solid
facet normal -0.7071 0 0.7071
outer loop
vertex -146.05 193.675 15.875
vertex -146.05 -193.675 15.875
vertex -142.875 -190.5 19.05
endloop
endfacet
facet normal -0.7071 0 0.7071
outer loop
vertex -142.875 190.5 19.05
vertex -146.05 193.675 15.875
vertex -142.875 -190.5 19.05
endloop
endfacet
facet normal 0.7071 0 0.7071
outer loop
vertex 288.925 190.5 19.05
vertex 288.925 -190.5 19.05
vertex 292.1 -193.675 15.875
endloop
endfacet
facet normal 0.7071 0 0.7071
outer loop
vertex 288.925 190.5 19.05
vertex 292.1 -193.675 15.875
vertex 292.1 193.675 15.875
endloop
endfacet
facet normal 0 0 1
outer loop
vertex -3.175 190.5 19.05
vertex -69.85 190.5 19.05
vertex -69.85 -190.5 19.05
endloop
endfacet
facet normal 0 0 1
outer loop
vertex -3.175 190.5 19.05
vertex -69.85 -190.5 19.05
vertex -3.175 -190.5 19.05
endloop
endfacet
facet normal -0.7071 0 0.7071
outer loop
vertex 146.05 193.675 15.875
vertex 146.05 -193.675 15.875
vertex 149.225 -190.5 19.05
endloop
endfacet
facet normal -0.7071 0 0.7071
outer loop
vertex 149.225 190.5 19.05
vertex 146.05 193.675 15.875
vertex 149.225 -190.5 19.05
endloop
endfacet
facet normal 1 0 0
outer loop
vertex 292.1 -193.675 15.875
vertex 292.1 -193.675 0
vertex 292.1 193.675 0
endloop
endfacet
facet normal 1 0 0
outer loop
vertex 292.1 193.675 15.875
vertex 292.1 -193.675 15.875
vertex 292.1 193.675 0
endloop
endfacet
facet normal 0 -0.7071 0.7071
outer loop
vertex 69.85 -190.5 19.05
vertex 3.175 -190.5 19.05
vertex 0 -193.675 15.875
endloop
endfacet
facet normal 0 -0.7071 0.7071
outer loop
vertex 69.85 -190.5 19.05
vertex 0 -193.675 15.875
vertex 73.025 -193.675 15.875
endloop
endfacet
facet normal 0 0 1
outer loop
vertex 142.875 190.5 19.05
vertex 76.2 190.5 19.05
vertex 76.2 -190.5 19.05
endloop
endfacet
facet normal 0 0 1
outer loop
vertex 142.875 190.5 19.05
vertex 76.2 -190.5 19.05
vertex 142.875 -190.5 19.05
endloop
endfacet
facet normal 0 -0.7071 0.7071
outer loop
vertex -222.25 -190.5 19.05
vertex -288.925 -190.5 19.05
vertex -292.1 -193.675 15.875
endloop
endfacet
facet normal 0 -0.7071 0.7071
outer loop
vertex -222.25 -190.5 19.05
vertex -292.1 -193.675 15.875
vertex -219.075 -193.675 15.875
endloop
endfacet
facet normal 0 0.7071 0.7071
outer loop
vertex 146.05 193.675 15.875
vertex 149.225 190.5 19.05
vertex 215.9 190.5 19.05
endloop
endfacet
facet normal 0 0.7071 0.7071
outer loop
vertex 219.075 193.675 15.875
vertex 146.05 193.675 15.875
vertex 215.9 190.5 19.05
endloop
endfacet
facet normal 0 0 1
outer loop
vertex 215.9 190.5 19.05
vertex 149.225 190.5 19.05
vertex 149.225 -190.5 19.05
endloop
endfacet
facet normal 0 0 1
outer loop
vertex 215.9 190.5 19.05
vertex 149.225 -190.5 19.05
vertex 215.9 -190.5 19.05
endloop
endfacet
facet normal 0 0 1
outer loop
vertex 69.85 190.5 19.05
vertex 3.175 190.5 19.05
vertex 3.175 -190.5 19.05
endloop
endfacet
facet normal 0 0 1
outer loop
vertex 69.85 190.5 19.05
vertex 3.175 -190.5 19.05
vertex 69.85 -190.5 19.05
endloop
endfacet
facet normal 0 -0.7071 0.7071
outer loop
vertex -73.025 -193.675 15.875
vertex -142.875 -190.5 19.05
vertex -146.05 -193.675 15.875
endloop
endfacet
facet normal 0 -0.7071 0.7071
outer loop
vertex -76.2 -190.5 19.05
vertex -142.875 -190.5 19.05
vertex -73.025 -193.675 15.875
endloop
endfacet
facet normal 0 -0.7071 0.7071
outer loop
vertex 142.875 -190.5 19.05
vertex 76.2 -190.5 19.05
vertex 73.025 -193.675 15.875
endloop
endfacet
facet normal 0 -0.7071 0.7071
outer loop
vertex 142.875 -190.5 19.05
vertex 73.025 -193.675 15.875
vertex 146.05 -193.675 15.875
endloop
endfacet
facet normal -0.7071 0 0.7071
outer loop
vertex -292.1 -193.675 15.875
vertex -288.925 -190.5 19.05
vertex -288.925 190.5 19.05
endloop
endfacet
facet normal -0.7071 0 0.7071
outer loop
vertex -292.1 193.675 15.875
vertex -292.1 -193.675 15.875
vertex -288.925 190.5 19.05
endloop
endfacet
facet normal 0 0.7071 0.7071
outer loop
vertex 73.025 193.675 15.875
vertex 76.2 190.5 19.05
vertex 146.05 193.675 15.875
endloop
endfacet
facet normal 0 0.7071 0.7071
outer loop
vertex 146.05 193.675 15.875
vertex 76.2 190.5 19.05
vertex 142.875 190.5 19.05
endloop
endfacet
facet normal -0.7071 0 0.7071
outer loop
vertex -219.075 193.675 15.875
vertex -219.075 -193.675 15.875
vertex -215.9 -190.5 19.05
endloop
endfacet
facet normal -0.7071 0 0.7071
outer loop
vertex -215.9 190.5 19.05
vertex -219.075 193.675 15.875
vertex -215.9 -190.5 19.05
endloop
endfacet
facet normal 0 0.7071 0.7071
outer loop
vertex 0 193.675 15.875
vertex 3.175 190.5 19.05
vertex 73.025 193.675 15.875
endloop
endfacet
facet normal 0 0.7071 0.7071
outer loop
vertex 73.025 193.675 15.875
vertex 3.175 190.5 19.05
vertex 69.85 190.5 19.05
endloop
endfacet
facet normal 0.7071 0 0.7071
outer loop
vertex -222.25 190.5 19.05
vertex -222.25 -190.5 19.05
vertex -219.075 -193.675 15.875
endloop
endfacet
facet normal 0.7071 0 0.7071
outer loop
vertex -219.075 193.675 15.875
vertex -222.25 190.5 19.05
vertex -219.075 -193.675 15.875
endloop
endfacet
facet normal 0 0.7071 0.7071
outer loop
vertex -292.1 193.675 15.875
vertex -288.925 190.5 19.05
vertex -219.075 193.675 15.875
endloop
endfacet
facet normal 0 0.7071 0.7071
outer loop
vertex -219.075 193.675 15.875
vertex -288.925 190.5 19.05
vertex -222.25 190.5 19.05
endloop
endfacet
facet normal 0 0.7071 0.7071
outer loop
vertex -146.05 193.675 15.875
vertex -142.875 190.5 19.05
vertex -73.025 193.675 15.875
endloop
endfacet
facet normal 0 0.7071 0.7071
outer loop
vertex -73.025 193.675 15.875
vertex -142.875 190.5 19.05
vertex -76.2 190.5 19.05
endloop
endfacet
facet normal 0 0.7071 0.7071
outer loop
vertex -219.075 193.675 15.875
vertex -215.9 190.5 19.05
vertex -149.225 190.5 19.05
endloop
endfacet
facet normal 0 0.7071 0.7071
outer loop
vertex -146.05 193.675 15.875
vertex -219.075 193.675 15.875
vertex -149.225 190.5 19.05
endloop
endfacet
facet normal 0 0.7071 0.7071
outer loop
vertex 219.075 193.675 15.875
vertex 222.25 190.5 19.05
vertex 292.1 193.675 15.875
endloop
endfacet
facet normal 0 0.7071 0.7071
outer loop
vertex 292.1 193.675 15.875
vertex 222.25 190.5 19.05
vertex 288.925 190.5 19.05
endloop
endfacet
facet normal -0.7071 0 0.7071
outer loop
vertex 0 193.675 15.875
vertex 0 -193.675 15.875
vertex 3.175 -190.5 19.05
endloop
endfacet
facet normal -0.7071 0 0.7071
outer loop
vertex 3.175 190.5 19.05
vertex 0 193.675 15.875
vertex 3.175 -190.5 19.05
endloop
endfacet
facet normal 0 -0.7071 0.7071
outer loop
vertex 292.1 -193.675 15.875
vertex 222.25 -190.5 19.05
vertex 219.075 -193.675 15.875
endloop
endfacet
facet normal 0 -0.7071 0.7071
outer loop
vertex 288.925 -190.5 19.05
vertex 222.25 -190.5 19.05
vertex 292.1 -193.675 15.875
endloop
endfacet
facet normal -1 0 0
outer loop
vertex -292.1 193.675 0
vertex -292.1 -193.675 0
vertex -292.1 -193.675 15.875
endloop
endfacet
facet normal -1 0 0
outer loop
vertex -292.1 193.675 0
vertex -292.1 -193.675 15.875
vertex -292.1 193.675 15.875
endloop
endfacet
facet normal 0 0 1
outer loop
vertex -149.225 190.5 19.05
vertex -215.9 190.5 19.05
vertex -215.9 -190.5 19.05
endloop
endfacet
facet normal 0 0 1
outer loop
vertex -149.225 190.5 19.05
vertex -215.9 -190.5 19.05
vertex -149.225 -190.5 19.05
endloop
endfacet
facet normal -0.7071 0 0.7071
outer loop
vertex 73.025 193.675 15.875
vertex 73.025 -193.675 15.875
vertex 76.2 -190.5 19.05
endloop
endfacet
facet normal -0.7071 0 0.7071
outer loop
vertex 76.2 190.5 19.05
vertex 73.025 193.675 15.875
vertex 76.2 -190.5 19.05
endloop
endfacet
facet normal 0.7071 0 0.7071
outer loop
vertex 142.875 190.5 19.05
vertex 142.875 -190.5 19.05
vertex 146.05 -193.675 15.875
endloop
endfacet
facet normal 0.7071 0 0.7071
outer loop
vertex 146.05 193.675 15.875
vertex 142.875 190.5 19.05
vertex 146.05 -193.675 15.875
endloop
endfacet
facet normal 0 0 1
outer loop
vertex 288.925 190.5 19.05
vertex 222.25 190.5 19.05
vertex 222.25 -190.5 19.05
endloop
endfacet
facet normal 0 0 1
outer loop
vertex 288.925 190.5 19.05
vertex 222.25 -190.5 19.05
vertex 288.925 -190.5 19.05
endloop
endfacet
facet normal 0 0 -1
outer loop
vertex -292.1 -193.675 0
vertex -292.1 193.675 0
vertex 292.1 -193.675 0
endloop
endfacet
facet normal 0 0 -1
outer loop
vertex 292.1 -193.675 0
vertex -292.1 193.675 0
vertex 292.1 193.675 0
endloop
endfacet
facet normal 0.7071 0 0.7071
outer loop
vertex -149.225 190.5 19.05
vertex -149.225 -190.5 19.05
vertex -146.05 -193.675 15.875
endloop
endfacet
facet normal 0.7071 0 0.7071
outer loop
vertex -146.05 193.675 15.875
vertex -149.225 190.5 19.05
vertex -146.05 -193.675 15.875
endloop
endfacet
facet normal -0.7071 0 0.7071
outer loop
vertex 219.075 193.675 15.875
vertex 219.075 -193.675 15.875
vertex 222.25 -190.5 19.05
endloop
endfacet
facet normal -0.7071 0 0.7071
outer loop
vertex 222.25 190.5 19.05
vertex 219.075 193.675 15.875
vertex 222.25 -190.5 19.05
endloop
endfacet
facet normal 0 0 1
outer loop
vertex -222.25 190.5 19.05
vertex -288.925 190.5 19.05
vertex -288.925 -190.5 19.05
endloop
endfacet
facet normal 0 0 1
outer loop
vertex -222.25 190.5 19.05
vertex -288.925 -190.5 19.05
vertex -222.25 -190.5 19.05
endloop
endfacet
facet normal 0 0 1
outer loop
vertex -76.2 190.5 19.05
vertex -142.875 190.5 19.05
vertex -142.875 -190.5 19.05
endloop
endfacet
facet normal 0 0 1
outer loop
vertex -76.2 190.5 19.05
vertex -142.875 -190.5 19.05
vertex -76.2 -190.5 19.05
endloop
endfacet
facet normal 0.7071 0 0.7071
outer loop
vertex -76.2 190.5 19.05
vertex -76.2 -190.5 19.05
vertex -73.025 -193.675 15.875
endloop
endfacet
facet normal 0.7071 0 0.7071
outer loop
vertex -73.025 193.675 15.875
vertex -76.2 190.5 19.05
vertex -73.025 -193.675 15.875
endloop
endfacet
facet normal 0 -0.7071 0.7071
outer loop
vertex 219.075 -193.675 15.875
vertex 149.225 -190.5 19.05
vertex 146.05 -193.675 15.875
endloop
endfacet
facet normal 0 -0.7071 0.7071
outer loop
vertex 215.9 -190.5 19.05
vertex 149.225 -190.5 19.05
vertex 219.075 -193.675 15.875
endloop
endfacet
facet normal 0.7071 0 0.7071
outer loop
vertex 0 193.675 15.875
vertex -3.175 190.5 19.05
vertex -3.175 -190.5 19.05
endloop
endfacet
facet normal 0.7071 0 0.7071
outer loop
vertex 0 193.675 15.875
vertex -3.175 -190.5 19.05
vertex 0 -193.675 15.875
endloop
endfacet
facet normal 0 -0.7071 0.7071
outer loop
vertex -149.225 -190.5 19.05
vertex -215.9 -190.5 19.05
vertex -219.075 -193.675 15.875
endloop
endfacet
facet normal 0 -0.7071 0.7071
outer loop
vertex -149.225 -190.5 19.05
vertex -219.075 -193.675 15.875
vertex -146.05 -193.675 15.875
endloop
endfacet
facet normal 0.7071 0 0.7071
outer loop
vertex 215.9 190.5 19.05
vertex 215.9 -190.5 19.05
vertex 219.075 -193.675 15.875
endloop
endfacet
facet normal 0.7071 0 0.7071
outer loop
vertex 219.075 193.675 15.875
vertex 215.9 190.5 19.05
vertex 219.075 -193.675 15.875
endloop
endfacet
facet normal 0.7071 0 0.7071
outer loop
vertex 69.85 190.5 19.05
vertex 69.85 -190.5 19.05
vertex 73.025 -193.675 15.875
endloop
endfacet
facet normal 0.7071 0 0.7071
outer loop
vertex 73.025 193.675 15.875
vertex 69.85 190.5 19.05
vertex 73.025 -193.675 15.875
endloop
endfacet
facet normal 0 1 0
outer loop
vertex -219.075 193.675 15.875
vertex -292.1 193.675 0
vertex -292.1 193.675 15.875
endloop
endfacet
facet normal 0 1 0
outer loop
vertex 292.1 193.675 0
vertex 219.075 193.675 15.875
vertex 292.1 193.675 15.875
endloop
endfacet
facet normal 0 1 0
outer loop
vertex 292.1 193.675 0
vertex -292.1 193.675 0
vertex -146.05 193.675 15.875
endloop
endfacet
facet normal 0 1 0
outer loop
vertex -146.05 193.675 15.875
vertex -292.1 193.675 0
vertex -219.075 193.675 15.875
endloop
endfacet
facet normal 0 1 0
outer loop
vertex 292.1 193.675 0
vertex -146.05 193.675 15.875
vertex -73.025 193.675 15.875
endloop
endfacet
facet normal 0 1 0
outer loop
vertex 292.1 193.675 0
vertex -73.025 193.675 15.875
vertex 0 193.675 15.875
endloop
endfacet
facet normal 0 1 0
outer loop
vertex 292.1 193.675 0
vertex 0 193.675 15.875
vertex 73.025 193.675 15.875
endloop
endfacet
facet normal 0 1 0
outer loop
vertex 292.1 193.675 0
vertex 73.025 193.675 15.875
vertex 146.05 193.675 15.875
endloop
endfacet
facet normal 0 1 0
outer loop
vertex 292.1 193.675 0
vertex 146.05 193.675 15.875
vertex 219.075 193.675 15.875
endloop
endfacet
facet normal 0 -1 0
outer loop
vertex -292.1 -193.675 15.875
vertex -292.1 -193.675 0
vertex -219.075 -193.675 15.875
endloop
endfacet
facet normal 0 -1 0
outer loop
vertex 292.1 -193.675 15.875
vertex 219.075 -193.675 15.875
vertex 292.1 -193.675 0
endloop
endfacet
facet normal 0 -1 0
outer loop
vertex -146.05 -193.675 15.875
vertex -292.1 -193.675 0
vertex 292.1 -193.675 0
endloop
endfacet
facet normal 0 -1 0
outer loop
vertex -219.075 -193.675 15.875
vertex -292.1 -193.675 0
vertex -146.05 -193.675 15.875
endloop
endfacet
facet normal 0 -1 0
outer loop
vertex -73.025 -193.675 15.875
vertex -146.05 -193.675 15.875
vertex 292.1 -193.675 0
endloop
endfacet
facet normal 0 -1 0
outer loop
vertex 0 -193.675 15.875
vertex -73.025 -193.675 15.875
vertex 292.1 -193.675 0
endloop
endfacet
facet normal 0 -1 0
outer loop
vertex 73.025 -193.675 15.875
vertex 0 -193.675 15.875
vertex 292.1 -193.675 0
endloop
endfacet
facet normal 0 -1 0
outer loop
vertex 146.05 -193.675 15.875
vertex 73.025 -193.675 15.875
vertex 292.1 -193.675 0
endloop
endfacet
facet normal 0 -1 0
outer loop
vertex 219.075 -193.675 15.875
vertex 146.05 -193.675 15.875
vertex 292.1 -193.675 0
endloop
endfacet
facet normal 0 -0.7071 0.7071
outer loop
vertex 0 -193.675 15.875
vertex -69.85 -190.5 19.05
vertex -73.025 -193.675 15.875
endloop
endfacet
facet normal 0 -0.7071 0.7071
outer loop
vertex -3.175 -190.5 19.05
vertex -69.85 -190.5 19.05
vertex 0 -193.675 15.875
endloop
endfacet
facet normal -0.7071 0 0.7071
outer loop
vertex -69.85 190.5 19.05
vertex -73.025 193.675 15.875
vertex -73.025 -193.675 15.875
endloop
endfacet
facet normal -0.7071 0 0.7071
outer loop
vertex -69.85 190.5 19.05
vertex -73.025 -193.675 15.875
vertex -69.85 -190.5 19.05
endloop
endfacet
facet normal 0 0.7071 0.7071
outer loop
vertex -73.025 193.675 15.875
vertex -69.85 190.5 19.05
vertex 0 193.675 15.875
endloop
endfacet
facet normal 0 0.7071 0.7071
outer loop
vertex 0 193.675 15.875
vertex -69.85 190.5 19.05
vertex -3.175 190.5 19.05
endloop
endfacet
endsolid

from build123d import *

# Parameters (mm, degrees)
F0_W     = 584.2
F0_H     = 387.35
F1_DEPTH = 19.05
F3_DEPTH = 387.351
F4_SIZE  = 3.17499


# Not quite as in the source:
# - a fillet or chamfer is up to 0.001 mm smaller than in the source, because OpenCascade refuses the exact size


with BuildPart() as f1:
    # F0 (on Top) → F1 (new body)
    with BuildSketch(Plane.XY):
        Rectangle(F0_W, F0_H)
    extrude(amount=F1_DEPTH)

    # F2 (on face) → F3 (cut, through all)
    with BuildSketch(Plane.XZ.offset(193.675)):
        Polygon((-219.075, 19.05), (-222.25, 19.05), (-219.075, 15.875), (-215.9, 19.05), align=None)
        Polygon((-146.05, 19.05), (-149.225, 19.05), (-146.05, 15.875), (-142.875, 19.05), align=None)
        Polygon((-73.025, 19.05), (-76.2, 19.05), (-73.025, 15.875), (-69.85, 19.05), align=None)
        Polygon((0, 19.05), (-3.175, 19.05), (0, 15.875), (3.175, 19.05), align=None)
        Polygon((73.025, 19.05), (69.85, 19.05), (73.025, 15.875), (76.2, 19.05), align=None)
        Polygon((146.05, 19.05), (142.875, 19.05), (146.05, 15.875), (149.225, 19.05), align=None)
        Polygon((219.075, 19.05), (215.9, 19.05), (219.075, 15.875), (222.25, 19.05), align=None)
    extrude(amount=-F3_DEPTH, mode=Mode.SUBTRACT)

    # F4 (size 3.175 in the source; OpenCascade refuses exactly that, so slightly less here)
    f4_edges = [f1.edges().sort_by_distance(p)[0] for p in [
        (-292.1, 0, 19.05),
        (-257.175, -193.675, 19.05),
        (-182.5625, -193.675, 19.05),
        (-109.5375, -193.675, 19.05),
        (-36.5125, -193.675, 19.05),
        (36.5125, -193.675, 19.05),
        (109.5375, -193.675, 19.05),
        (182.5625, -193.675, 19.05),
        (257.175, -193.675, 19.05),
        (257.175, 193.675, 19.05),
        (182.5625, 193.675, 19.05),
        (109.5375, 193.675, 19.05),
        (36.5125, 193.675, 19.05),
        (-36.5125, 193.675, 19.05),
        (-109.5375, 193.675, 19.05),
        (-182.5625, 193.675, 19.05),
        (-257.175, 193.675, 19.05),
        (292.1, 0, 19.05),
    ]]
    chamfer(f4_edges, length=F4_SIZE)


solid = f1.part
